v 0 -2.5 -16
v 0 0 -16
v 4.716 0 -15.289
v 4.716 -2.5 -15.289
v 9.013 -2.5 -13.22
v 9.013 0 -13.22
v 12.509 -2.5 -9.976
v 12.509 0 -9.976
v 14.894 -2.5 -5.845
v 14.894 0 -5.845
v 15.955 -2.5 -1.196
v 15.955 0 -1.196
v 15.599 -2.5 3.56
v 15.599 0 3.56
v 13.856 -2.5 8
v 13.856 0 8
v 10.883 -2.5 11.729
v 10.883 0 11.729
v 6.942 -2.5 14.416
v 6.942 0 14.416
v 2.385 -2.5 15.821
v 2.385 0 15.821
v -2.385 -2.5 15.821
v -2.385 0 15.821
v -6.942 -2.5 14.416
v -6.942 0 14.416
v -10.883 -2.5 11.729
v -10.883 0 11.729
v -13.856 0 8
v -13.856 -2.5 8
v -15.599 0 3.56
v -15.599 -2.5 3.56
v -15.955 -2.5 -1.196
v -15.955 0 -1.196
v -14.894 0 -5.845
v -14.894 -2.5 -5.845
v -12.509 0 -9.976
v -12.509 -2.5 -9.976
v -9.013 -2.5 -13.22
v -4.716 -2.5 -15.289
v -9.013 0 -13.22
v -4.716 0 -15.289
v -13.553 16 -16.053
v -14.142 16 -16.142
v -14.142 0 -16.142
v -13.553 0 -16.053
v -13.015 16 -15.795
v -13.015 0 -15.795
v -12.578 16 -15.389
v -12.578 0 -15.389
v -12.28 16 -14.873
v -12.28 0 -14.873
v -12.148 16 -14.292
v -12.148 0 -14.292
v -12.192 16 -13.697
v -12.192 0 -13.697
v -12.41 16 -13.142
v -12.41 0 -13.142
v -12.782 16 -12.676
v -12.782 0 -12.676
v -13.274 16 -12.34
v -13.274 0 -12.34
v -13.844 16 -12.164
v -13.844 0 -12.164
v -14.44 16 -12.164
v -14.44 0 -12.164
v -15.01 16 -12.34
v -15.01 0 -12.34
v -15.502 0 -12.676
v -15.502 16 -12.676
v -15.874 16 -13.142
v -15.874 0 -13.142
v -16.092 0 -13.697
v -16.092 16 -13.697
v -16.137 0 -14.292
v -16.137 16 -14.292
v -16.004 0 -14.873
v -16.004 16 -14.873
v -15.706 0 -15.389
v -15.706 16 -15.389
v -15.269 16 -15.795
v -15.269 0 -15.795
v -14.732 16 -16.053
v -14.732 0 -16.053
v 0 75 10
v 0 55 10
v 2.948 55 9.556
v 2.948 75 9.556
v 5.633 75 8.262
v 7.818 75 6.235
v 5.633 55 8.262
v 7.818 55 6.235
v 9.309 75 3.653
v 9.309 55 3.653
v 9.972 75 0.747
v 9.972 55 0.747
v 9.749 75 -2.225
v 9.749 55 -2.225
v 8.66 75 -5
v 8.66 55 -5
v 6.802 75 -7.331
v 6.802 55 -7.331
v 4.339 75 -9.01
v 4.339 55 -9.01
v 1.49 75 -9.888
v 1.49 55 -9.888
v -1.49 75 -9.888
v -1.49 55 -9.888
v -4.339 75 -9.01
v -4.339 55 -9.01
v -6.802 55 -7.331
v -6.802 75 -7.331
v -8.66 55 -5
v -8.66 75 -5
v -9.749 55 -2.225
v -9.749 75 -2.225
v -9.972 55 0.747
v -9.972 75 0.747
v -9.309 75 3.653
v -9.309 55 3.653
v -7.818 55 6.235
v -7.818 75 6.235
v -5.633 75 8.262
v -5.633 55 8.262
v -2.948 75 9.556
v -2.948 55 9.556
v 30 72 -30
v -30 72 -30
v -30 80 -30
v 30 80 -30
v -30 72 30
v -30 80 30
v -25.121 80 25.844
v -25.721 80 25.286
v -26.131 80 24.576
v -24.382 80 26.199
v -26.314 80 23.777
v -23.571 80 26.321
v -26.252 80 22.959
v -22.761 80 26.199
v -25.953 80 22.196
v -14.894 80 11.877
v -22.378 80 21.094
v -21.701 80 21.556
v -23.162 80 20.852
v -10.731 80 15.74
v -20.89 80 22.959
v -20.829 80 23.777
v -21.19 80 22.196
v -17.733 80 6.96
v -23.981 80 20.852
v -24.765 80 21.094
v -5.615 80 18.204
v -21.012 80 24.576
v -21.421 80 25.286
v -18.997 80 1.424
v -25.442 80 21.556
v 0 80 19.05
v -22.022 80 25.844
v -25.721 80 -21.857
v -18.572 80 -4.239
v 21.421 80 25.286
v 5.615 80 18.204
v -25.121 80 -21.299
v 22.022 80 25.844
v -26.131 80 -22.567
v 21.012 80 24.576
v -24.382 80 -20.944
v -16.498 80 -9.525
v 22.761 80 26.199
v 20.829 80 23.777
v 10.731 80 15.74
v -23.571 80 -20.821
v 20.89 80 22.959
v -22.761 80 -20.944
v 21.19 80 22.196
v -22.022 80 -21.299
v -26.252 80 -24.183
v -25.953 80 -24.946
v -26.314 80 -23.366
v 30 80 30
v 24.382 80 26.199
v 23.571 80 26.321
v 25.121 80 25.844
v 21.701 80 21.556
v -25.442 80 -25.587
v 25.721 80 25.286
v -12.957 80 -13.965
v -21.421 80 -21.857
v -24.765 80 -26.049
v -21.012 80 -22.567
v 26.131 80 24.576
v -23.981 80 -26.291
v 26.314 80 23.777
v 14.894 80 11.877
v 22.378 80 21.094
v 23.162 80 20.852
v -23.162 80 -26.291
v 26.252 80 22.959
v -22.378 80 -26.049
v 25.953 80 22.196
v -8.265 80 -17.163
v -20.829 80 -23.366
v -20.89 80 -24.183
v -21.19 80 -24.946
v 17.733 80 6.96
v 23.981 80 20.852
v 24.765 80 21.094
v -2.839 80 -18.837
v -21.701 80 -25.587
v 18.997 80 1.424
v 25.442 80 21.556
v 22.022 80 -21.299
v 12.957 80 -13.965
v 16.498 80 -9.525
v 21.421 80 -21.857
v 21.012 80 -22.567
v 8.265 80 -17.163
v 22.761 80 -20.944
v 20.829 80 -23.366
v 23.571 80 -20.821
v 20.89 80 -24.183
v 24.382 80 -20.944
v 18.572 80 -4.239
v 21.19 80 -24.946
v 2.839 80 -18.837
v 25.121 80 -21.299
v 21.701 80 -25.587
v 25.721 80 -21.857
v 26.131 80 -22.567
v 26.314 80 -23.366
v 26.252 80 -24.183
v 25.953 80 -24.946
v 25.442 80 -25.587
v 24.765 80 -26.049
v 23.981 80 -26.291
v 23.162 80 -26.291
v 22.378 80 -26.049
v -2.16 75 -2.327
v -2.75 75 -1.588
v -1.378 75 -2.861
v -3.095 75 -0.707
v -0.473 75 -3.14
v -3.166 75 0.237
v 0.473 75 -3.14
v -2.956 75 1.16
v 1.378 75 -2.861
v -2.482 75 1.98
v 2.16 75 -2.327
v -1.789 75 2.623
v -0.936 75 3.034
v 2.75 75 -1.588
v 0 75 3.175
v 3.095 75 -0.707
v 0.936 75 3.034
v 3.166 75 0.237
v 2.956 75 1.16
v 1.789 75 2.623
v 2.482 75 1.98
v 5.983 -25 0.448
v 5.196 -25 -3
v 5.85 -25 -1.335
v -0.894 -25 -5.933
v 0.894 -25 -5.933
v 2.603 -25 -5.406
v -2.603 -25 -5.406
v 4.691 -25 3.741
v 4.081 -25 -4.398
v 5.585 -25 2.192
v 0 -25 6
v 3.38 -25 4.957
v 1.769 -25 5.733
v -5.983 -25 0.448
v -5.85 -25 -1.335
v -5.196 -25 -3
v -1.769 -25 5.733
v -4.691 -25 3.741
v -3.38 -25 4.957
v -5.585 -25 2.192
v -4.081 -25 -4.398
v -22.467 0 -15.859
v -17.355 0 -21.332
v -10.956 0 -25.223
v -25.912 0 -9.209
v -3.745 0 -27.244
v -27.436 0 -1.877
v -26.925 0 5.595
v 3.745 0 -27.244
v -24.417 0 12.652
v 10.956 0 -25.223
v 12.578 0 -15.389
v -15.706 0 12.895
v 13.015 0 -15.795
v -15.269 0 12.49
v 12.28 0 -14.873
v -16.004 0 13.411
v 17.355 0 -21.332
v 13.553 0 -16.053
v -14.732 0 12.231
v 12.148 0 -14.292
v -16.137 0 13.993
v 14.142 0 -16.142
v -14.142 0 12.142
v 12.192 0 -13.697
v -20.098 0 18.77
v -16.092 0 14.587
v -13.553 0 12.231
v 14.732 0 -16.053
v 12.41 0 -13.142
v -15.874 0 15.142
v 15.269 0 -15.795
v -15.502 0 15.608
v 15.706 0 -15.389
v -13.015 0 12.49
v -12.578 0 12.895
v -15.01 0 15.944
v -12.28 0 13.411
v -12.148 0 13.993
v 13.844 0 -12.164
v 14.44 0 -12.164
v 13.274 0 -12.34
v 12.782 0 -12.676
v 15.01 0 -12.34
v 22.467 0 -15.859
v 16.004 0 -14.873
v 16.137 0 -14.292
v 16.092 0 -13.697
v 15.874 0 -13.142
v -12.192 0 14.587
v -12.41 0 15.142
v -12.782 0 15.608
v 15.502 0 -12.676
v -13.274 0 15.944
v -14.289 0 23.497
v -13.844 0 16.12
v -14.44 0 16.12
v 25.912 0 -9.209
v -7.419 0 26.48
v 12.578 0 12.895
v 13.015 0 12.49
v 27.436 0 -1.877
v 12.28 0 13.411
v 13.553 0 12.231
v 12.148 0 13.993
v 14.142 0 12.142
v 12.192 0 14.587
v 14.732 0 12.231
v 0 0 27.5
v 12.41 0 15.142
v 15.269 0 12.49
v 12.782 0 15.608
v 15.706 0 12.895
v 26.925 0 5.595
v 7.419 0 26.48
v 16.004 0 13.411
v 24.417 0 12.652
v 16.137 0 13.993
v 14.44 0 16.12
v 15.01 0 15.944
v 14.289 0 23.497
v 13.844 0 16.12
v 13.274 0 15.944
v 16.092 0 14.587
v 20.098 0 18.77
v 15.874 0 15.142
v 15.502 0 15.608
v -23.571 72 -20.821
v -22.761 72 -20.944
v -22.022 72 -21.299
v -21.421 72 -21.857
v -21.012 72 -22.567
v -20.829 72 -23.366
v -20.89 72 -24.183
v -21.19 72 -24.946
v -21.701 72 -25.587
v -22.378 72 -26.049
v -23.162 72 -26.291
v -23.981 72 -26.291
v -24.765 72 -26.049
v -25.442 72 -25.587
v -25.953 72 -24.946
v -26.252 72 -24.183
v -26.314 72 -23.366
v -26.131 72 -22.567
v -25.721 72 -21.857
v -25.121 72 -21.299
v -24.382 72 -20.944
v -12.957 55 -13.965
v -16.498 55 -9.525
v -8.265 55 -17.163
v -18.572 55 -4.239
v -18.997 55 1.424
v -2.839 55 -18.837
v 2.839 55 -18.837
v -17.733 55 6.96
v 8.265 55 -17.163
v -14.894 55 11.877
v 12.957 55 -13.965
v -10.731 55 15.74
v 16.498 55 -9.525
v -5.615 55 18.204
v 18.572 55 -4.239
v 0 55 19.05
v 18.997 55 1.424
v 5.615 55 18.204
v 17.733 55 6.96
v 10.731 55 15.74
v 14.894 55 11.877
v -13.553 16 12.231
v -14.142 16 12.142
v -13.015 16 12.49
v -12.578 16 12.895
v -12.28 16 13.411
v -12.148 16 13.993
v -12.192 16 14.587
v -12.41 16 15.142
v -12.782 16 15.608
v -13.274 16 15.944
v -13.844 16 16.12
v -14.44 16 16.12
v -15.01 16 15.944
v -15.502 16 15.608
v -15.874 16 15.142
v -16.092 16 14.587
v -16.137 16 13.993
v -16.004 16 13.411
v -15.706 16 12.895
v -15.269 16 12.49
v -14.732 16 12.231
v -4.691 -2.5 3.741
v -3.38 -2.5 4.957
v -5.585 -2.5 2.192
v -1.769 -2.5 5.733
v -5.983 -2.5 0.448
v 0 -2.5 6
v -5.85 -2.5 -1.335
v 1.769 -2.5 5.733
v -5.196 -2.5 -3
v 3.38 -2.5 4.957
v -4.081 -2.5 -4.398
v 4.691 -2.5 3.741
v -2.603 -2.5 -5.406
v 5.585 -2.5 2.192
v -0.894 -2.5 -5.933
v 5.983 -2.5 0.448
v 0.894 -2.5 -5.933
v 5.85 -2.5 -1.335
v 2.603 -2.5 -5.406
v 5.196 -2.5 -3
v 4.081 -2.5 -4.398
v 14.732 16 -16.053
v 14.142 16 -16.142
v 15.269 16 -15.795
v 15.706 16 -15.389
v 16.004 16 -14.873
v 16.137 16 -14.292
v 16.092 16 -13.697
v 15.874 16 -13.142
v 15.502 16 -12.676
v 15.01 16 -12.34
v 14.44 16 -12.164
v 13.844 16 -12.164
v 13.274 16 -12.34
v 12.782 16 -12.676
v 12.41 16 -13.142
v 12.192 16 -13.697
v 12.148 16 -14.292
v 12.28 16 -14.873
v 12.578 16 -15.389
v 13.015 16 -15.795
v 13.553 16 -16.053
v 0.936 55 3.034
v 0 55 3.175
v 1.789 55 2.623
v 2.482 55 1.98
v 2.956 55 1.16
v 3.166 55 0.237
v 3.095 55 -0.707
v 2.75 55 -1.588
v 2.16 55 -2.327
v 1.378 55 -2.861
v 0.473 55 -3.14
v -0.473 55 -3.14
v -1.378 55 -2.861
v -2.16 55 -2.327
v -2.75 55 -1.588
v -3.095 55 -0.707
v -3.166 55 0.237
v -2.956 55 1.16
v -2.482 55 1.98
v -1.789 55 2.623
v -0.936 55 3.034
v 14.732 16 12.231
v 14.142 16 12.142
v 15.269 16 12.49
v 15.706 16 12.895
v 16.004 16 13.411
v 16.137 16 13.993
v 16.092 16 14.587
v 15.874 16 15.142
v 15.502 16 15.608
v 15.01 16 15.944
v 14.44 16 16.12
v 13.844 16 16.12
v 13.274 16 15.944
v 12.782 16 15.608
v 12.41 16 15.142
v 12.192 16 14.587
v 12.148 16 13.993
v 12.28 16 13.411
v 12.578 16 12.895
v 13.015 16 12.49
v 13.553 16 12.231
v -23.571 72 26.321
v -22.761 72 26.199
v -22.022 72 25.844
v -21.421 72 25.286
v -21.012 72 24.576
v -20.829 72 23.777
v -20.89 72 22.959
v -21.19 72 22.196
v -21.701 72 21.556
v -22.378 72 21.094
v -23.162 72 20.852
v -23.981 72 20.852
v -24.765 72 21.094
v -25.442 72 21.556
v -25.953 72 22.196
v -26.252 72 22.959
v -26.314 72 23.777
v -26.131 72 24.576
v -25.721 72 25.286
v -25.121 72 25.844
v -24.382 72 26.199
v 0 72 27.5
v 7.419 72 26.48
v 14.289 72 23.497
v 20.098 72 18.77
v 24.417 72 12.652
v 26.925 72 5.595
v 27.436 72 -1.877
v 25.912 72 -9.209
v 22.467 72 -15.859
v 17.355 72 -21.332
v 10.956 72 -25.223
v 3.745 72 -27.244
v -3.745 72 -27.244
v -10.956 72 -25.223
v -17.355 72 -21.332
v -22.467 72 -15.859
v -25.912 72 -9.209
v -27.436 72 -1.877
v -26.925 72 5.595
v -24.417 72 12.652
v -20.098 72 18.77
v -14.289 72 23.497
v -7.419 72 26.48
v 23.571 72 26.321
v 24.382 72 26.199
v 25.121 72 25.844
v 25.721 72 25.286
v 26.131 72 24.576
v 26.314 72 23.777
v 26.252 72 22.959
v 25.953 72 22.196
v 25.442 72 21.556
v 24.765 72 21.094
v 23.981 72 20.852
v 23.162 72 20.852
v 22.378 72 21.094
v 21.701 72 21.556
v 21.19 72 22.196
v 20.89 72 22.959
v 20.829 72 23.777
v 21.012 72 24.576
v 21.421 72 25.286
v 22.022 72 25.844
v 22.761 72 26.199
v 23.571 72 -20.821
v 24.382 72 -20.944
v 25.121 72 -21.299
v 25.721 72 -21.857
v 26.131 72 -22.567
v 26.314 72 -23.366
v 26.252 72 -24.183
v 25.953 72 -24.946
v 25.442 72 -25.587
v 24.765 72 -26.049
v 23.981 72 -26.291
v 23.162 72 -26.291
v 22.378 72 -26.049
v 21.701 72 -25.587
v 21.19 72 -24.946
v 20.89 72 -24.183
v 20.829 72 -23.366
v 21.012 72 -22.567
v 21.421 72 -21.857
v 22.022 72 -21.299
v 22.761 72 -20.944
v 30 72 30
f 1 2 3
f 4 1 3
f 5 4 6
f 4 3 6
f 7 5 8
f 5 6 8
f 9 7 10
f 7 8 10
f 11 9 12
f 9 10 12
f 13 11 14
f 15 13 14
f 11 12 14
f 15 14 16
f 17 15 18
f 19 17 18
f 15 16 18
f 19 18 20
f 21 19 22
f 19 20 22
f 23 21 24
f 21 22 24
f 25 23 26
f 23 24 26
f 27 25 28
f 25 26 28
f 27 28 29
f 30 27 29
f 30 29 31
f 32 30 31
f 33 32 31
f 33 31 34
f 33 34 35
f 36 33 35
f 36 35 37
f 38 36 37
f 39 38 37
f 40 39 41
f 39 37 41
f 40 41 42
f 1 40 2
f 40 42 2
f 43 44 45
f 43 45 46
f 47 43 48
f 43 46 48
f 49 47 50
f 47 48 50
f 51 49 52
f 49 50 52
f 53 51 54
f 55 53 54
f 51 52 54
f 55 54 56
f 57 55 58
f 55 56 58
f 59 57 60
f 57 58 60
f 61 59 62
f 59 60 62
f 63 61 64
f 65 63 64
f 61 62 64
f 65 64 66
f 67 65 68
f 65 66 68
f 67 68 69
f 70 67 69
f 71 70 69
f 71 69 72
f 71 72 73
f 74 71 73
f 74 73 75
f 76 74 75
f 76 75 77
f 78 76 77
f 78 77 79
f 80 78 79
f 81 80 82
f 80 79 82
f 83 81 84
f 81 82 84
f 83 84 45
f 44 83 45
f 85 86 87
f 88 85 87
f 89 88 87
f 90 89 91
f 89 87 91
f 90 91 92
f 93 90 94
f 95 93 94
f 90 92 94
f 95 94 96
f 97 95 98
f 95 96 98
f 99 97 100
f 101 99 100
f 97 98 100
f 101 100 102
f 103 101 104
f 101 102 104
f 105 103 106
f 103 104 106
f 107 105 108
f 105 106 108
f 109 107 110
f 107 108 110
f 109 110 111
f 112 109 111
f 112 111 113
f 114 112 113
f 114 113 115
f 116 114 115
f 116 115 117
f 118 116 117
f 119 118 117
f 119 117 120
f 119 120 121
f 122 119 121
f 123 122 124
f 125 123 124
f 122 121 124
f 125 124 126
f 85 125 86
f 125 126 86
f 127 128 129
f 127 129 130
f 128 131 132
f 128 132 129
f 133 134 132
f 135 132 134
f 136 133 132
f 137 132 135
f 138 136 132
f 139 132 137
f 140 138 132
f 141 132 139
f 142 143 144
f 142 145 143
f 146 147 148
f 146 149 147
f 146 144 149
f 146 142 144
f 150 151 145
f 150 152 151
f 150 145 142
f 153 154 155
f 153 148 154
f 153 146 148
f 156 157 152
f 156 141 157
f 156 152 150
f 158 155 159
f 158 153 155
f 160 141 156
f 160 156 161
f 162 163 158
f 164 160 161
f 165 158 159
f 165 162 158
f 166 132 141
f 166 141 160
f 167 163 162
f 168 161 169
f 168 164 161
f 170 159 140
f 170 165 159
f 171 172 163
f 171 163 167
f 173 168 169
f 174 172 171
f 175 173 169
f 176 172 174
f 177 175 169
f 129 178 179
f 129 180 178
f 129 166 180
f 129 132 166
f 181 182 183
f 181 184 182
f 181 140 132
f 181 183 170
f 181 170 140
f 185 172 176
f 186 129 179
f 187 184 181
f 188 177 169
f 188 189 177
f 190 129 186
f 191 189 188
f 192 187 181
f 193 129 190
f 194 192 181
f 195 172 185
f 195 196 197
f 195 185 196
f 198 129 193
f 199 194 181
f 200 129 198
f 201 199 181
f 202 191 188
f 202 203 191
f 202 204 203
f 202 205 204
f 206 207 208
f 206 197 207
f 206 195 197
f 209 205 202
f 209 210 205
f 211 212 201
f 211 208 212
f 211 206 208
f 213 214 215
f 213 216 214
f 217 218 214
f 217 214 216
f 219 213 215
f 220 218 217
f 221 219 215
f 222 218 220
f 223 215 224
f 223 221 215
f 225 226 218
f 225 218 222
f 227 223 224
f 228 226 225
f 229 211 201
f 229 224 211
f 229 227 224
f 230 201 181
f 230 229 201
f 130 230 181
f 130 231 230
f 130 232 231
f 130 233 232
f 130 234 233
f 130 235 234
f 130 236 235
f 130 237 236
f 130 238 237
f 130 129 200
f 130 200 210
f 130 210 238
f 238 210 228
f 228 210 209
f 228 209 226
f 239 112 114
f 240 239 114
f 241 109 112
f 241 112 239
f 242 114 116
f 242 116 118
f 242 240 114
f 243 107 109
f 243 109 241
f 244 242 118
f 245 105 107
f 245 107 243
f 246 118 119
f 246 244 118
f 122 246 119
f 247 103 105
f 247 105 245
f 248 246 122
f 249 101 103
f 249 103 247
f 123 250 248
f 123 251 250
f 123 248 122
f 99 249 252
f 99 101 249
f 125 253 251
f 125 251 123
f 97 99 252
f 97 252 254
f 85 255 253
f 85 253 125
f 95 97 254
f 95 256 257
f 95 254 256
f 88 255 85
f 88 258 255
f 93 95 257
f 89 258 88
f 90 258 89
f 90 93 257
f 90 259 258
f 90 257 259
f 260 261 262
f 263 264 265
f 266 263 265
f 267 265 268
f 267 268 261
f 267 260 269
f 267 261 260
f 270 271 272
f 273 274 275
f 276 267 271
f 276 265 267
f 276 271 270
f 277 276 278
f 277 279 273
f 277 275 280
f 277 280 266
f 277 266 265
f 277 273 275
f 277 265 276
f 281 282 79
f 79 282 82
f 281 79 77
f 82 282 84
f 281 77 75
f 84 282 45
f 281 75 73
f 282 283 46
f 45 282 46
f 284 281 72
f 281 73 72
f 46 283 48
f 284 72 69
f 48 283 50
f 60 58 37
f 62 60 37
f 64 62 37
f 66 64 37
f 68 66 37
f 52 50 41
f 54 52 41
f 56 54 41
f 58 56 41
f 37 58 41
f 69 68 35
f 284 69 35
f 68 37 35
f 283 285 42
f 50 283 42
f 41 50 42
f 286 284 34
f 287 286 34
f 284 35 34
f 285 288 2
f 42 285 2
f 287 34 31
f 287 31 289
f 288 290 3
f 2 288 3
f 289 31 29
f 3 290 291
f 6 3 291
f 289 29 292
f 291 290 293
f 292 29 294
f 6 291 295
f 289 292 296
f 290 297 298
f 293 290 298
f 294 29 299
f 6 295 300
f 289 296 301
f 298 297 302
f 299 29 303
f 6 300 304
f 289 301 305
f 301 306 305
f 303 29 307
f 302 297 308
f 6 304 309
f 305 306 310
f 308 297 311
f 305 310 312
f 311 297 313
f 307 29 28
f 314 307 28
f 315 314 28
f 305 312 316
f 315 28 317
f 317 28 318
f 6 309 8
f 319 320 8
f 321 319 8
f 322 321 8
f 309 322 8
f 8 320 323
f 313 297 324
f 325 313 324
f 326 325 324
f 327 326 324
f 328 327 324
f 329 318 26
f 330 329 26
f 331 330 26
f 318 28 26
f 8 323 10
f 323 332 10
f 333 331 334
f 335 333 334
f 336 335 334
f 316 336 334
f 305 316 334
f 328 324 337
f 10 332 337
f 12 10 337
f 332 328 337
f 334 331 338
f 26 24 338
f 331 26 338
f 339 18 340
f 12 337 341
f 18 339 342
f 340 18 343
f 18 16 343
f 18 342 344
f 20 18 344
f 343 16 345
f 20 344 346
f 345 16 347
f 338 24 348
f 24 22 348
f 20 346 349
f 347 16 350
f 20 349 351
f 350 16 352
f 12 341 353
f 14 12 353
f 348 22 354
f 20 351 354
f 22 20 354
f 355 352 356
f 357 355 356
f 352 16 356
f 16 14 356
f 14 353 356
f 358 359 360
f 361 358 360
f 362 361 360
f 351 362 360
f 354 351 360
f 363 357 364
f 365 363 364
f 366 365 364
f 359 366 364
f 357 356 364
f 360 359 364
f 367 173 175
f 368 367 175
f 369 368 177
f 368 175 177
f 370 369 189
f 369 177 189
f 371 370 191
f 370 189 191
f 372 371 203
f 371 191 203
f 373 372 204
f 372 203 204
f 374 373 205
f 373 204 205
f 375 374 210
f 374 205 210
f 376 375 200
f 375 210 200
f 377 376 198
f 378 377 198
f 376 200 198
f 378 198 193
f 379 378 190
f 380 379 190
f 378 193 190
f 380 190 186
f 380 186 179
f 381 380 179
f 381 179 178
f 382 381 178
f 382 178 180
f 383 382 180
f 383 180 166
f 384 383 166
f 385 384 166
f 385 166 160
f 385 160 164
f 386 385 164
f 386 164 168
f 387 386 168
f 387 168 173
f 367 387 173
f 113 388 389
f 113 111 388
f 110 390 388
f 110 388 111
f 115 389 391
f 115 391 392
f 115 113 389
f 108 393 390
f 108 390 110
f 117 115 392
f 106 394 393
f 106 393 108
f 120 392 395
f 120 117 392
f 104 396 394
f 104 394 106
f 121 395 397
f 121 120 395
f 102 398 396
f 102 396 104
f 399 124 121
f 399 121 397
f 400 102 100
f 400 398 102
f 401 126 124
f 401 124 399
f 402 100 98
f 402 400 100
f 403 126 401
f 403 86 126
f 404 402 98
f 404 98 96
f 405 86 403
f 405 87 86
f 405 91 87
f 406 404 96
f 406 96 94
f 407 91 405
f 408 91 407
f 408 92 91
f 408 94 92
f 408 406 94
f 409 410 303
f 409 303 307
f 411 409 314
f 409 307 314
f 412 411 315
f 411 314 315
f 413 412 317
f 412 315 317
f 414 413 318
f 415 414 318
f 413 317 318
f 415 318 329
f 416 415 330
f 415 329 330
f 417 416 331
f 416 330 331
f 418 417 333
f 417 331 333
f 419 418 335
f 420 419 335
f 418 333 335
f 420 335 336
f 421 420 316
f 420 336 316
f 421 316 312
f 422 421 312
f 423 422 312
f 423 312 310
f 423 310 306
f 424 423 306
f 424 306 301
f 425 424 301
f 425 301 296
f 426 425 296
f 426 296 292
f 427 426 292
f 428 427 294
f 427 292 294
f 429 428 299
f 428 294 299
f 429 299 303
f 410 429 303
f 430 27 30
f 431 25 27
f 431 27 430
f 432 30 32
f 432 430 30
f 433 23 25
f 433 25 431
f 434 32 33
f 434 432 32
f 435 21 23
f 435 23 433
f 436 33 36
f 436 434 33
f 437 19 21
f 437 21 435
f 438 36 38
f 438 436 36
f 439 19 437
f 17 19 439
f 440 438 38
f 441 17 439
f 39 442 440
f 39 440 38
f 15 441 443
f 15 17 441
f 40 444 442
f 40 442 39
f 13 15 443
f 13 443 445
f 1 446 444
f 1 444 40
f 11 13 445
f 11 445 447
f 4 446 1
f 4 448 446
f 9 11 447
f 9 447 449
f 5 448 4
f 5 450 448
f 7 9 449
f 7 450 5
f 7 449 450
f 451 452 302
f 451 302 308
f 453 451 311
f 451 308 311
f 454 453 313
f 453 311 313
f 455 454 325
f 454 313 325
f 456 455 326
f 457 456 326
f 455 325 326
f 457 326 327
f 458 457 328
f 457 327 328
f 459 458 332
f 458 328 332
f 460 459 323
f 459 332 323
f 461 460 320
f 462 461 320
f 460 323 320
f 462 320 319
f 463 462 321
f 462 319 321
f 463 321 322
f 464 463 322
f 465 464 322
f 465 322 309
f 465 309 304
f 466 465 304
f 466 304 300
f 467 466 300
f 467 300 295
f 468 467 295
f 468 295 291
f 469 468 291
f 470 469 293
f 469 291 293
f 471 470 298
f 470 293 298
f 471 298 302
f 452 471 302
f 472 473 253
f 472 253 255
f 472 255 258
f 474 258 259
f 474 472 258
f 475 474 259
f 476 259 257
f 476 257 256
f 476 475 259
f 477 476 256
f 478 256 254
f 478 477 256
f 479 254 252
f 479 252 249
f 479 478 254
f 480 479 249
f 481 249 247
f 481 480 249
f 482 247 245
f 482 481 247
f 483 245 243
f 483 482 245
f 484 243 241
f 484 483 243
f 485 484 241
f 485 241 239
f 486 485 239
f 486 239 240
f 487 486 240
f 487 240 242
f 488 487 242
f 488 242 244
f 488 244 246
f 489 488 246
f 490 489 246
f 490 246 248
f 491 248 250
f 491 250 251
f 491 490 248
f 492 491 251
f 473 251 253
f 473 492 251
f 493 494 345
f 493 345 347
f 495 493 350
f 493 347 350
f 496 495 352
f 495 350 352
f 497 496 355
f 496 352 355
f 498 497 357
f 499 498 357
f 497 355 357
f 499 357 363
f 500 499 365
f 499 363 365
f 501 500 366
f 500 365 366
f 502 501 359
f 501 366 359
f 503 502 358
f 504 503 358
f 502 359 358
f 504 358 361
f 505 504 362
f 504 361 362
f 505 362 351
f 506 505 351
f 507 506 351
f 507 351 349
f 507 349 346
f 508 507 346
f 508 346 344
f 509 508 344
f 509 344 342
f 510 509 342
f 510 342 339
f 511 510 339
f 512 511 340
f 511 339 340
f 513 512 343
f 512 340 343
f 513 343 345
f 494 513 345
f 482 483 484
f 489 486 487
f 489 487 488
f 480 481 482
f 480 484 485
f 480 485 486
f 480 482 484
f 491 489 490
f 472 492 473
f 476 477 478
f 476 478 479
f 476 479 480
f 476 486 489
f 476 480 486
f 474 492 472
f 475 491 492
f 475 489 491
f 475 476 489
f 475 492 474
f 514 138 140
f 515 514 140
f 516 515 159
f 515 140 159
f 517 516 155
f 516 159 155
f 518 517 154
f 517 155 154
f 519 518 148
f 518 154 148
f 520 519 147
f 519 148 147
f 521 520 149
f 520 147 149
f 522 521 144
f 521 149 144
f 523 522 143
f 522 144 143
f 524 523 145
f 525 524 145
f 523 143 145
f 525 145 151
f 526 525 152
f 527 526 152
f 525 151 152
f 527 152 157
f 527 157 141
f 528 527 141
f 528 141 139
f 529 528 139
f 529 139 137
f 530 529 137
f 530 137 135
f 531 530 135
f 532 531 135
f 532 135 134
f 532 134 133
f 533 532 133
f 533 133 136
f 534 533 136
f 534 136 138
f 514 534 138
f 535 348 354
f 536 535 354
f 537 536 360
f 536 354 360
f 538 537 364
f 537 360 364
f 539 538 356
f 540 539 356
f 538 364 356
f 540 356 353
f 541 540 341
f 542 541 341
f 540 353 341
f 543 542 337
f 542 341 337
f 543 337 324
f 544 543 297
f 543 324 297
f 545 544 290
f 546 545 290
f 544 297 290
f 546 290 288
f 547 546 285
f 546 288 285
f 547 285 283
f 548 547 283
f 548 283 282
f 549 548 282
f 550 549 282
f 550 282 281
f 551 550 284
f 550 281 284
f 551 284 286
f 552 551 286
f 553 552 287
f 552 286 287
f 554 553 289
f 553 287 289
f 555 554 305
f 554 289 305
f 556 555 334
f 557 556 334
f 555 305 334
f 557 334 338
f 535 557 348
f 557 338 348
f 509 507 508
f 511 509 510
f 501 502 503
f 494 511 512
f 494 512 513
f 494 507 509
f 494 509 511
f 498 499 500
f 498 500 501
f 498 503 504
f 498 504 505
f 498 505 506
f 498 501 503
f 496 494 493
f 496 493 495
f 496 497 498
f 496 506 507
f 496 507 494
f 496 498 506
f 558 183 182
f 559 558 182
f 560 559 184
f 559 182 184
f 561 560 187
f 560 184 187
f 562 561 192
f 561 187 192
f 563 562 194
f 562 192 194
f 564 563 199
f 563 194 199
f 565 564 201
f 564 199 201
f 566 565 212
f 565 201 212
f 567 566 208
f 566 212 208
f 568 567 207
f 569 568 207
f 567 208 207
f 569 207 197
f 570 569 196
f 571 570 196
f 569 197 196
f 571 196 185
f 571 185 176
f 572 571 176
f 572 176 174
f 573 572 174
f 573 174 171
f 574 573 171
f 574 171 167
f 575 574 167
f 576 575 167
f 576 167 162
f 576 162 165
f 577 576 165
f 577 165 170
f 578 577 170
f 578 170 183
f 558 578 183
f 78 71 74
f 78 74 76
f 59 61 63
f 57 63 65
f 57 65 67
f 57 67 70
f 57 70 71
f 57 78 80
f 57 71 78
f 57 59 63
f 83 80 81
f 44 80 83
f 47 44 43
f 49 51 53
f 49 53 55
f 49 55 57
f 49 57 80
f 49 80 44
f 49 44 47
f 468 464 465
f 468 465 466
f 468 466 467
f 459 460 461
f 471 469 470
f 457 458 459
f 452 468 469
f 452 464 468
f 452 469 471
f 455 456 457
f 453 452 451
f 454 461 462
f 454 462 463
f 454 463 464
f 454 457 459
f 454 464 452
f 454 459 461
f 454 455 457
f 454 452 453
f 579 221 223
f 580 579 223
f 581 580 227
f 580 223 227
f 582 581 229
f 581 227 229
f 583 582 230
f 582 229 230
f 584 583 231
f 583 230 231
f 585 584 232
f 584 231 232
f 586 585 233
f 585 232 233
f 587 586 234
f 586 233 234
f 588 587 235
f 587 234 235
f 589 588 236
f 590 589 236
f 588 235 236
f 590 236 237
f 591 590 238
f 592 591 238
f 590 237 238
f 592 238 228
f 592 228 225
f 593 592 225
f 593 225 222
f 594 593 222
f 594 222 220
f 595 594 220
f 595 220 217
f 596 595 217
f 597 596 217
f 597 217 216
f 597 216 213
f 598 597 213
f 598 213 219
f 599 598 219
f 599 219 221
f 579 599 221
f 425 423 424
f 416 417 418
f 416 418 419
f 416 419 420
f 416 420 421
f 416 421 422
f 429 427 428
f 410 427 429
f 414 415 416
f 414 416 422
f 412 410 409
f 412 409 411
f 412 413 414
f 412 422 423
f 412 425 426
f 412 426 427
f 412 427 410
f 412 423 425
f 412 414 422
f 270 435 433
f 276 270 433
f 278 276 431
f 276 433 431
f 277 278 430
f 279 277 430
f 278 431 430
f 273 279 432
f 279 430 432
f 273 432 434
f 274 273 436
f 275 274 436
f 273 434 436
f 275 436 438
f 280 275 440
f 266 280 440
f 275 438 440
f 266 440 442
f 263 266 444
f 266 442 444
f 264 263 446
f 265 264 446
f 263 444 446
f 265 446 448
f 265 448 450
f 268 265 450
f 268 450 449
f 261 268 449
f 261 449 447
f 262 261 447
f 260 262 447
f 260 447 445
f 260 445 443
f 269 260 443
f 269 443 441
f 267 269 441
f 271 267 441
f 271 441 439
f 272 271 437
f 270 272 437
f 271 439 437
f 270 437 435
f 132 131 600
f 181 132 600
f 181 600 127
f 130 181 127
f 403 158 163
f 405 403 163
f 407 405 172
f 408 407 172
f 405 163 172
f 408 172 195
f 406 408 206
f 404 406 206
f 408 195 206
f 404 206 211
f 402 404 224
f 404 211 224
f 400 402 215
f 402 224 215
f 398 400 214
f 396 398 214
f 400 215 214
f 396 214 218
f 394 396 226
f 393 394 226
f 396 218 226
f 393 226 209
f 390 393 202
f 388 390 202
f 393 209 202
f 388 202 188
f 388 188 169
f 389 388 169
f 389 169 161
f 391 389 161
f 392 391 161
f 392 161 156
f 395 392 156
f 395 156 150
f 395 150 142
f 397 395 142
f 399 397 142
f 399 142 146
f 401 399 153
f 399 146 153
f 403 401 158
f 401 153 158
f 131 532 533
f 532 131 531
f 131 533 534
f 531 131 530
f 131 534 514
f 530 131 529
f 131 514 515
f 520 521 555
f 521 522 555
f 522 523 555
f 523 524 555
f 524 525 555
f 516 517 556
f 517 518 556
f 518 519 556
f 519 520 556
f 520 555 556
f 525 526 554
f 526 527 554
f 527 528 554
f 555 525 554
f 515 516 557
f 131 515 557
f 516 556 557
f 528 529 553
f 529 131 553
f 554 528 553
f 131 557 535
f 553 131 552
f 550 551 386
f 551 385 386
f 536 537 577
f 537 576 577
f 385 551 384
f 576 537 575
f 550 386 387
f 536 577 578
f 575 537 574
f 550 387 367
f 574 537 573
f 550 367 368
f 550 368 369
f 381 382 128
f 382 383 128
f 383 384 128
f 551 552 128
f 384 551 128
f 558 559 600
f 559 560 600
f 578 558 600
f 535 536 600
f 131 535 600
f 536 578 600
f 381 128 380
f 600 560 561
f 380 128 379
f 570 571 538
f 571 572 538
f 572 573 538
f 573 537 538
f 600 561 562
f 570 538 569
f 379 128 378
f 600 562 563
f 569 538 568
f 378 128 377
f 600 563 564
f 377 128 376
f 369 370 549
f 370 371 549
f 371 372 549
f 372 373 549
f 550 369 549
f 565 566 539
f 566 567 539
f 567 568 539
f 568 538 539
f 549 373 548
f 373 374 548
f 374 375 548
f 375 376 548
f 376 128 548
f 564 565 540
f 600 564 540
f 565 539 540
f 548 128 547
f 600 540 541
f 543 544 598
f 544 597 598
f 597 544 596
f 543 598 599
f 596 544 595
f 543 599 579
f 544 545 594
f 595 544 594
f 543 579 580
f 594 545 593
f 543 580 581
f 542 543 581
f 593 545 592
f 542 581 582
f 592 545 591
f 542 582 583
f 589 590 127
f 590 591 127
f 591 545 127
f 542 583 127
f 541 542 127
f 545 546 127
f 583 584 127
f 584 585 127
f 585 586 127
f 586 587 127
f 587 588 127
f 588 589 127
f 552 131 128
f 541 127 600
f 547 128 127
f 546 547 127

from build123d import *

# Parameters (mm, degrees)
SKETCH1_R           = 27.5
BOSS_EXTRUDE1_DEPTH = 72
SKETCH2_R           = 16
BOSS_EXTRUDE2_DEPTH = 2.5
SKETCH3_W           = 60
SKETCH3_H           = 60
BOSS_EXTRUDE3_DEPTH = 8
SKETCH4_R           = 6
BOSS_EXTRUDE4_DEPTH = 22.5
SKETCH5_R           = 2
CUT_EXTRUDE1_DEPTH  = 16
SKETCH6_R           = 19.05
CUT_EXTRUDE2_DEPTH  = 25
SKETCH7_R           = 10
SKETCH7_R_2         = 3.175
BOSS_EXTRUDE5_DEPTH = 20
SKETCH8_R           = 2.75
CUT_EXTRUDE3_DEPTH  = 10


with BuildPart() as part:
    # Sketch1 → Boss-Extrude1 (new body)
    with BuildSketch(Plane(origin=(0, 0, 0), x_dir=(1, 0, 0), z_dir=(0, 1, 0))):
        with Locations(Location((0, 0, 0), (0, 0, 270))):
            Circle(SKETCH1_R)
    extrude(amount=BOSS_EXTRUDE1_DEPTH)

    # Sketch2 → Boss-Extrude2 (add)
    with BuildSketch(Plane.XZ):
        with Locations(Location((0, 0, 0), (0, 0, 270))):
            Circle(SKETCH2_R)
    extrude(amount=BOSS_EXTRUDE2_DEPTH)

    # Sketch3 → Boss-Extrude3 (add)
    with BuildSketch(Plane(origin=(0, 72, 0), x_dir=(1, 0, 0), z_dir=(0, 1, 0))):
        Rectangle(SKETCH3_W, SKETCH3_H)
    extrude(amount=BOSS_EXTRUDE3_DEPTH)

    # Sketch4 → Boss-Extrude4 (add)
    with BuildSketch(Plane(origin=(0, -2.5, 0), x_dir=(-1, 0, 0), z_dir=(0, -1, 0))):
        with Locations(Location((0, 0, 0), (0, 0, 270))):
            Circle(SKETCH4_R)
    extrude(amount=BOSS_EXTRUDE4_DEPTH)

    # Sketch5 → Cut-Extrude1 (cut)
    with BuildSketch(Plane.XZ):
        with Locations(Location((14.142135624, 14.142135624, 0), (0, 0, 270))):
            Circle(SKETCH5_R)
        with Locations(Location((14.142135624, -14.142135624, 0), (0, 0, 270))):
            Circle(SKETCH5_R)
        with Locations(Location((-14.142135624, -14.142135624, 0), (0, 0, 270))):
            Circle(SKETCH5_R)
        with Locations(Location((-14.142135624, 14.142135624, 0), (0, 0, 270))):
            Circle(SKETCH5_R)
    extrude(amount=-CUT_EXTRUDE1_DEPTH, mode=Mode.SUBTRACT)

    # Sketch6 → Cut-Extrude2 (cut)
    with BuildSketch(Plane(origin=(0, 80, 0), x_dir=(1, 0, 0), z_dir=(0, 1, 0))):
        with Locations(Location((0, 0, 0), (0, 0, 270))):
            Circle(SKETCH6_R)
    extrude(amount=-CUT_EXTRUDE2_DEPTH, mode=Mode.SUBTRACT)

    # Sketch7 → Boss-Extrude5 (add)
    with BuildSketch(Plane(origin=(0, 55, 0), x_dir=(1, 0, 0), z_dir=(0, 1, 0))):
        with Locations(Location((0, 0, 0), (0, 0, 270))):
            Circle(SKETCH7_R)
        with Locations(Location((0, 0, 0), (0, 0, 270))):
            Circle(SKETCH7_R_2, mode=Mode.SUBTRACT)
    extrude(amount=BOSS_EXTRUDE5_DEPTH)

    # Sketch8 → Cut-Extrude3 (cut)
    with BuildSketch(Plane(origin=(0, 80, 0), x_dir=(1, 0, 0), z_dir=(0, 1, 0))):
        with Locations(Location((-23.571404551, 23.571404551, 0), (0, 0, 270))):
            Circle(SKETCH8_R)
        with Locations(Location((23.571404551, 23.571404551, 0), (0, 0, 270))):
            Circle(SKETCH8_R)
        with Locations(Location((23.571404551, -23.571404551, 0), (0, 0, 270))):
            Circle(SKETCH8_R)
        with Locations(Location((-23.571404551, -23.571404551, 0), (0, 0, 270))):
            Circle(SKETCH8_R)
    extrude(amount=-CUT_EXTRUDE3_DEPTH, mode=Mode.SUBTRACT)


solid = part.part
